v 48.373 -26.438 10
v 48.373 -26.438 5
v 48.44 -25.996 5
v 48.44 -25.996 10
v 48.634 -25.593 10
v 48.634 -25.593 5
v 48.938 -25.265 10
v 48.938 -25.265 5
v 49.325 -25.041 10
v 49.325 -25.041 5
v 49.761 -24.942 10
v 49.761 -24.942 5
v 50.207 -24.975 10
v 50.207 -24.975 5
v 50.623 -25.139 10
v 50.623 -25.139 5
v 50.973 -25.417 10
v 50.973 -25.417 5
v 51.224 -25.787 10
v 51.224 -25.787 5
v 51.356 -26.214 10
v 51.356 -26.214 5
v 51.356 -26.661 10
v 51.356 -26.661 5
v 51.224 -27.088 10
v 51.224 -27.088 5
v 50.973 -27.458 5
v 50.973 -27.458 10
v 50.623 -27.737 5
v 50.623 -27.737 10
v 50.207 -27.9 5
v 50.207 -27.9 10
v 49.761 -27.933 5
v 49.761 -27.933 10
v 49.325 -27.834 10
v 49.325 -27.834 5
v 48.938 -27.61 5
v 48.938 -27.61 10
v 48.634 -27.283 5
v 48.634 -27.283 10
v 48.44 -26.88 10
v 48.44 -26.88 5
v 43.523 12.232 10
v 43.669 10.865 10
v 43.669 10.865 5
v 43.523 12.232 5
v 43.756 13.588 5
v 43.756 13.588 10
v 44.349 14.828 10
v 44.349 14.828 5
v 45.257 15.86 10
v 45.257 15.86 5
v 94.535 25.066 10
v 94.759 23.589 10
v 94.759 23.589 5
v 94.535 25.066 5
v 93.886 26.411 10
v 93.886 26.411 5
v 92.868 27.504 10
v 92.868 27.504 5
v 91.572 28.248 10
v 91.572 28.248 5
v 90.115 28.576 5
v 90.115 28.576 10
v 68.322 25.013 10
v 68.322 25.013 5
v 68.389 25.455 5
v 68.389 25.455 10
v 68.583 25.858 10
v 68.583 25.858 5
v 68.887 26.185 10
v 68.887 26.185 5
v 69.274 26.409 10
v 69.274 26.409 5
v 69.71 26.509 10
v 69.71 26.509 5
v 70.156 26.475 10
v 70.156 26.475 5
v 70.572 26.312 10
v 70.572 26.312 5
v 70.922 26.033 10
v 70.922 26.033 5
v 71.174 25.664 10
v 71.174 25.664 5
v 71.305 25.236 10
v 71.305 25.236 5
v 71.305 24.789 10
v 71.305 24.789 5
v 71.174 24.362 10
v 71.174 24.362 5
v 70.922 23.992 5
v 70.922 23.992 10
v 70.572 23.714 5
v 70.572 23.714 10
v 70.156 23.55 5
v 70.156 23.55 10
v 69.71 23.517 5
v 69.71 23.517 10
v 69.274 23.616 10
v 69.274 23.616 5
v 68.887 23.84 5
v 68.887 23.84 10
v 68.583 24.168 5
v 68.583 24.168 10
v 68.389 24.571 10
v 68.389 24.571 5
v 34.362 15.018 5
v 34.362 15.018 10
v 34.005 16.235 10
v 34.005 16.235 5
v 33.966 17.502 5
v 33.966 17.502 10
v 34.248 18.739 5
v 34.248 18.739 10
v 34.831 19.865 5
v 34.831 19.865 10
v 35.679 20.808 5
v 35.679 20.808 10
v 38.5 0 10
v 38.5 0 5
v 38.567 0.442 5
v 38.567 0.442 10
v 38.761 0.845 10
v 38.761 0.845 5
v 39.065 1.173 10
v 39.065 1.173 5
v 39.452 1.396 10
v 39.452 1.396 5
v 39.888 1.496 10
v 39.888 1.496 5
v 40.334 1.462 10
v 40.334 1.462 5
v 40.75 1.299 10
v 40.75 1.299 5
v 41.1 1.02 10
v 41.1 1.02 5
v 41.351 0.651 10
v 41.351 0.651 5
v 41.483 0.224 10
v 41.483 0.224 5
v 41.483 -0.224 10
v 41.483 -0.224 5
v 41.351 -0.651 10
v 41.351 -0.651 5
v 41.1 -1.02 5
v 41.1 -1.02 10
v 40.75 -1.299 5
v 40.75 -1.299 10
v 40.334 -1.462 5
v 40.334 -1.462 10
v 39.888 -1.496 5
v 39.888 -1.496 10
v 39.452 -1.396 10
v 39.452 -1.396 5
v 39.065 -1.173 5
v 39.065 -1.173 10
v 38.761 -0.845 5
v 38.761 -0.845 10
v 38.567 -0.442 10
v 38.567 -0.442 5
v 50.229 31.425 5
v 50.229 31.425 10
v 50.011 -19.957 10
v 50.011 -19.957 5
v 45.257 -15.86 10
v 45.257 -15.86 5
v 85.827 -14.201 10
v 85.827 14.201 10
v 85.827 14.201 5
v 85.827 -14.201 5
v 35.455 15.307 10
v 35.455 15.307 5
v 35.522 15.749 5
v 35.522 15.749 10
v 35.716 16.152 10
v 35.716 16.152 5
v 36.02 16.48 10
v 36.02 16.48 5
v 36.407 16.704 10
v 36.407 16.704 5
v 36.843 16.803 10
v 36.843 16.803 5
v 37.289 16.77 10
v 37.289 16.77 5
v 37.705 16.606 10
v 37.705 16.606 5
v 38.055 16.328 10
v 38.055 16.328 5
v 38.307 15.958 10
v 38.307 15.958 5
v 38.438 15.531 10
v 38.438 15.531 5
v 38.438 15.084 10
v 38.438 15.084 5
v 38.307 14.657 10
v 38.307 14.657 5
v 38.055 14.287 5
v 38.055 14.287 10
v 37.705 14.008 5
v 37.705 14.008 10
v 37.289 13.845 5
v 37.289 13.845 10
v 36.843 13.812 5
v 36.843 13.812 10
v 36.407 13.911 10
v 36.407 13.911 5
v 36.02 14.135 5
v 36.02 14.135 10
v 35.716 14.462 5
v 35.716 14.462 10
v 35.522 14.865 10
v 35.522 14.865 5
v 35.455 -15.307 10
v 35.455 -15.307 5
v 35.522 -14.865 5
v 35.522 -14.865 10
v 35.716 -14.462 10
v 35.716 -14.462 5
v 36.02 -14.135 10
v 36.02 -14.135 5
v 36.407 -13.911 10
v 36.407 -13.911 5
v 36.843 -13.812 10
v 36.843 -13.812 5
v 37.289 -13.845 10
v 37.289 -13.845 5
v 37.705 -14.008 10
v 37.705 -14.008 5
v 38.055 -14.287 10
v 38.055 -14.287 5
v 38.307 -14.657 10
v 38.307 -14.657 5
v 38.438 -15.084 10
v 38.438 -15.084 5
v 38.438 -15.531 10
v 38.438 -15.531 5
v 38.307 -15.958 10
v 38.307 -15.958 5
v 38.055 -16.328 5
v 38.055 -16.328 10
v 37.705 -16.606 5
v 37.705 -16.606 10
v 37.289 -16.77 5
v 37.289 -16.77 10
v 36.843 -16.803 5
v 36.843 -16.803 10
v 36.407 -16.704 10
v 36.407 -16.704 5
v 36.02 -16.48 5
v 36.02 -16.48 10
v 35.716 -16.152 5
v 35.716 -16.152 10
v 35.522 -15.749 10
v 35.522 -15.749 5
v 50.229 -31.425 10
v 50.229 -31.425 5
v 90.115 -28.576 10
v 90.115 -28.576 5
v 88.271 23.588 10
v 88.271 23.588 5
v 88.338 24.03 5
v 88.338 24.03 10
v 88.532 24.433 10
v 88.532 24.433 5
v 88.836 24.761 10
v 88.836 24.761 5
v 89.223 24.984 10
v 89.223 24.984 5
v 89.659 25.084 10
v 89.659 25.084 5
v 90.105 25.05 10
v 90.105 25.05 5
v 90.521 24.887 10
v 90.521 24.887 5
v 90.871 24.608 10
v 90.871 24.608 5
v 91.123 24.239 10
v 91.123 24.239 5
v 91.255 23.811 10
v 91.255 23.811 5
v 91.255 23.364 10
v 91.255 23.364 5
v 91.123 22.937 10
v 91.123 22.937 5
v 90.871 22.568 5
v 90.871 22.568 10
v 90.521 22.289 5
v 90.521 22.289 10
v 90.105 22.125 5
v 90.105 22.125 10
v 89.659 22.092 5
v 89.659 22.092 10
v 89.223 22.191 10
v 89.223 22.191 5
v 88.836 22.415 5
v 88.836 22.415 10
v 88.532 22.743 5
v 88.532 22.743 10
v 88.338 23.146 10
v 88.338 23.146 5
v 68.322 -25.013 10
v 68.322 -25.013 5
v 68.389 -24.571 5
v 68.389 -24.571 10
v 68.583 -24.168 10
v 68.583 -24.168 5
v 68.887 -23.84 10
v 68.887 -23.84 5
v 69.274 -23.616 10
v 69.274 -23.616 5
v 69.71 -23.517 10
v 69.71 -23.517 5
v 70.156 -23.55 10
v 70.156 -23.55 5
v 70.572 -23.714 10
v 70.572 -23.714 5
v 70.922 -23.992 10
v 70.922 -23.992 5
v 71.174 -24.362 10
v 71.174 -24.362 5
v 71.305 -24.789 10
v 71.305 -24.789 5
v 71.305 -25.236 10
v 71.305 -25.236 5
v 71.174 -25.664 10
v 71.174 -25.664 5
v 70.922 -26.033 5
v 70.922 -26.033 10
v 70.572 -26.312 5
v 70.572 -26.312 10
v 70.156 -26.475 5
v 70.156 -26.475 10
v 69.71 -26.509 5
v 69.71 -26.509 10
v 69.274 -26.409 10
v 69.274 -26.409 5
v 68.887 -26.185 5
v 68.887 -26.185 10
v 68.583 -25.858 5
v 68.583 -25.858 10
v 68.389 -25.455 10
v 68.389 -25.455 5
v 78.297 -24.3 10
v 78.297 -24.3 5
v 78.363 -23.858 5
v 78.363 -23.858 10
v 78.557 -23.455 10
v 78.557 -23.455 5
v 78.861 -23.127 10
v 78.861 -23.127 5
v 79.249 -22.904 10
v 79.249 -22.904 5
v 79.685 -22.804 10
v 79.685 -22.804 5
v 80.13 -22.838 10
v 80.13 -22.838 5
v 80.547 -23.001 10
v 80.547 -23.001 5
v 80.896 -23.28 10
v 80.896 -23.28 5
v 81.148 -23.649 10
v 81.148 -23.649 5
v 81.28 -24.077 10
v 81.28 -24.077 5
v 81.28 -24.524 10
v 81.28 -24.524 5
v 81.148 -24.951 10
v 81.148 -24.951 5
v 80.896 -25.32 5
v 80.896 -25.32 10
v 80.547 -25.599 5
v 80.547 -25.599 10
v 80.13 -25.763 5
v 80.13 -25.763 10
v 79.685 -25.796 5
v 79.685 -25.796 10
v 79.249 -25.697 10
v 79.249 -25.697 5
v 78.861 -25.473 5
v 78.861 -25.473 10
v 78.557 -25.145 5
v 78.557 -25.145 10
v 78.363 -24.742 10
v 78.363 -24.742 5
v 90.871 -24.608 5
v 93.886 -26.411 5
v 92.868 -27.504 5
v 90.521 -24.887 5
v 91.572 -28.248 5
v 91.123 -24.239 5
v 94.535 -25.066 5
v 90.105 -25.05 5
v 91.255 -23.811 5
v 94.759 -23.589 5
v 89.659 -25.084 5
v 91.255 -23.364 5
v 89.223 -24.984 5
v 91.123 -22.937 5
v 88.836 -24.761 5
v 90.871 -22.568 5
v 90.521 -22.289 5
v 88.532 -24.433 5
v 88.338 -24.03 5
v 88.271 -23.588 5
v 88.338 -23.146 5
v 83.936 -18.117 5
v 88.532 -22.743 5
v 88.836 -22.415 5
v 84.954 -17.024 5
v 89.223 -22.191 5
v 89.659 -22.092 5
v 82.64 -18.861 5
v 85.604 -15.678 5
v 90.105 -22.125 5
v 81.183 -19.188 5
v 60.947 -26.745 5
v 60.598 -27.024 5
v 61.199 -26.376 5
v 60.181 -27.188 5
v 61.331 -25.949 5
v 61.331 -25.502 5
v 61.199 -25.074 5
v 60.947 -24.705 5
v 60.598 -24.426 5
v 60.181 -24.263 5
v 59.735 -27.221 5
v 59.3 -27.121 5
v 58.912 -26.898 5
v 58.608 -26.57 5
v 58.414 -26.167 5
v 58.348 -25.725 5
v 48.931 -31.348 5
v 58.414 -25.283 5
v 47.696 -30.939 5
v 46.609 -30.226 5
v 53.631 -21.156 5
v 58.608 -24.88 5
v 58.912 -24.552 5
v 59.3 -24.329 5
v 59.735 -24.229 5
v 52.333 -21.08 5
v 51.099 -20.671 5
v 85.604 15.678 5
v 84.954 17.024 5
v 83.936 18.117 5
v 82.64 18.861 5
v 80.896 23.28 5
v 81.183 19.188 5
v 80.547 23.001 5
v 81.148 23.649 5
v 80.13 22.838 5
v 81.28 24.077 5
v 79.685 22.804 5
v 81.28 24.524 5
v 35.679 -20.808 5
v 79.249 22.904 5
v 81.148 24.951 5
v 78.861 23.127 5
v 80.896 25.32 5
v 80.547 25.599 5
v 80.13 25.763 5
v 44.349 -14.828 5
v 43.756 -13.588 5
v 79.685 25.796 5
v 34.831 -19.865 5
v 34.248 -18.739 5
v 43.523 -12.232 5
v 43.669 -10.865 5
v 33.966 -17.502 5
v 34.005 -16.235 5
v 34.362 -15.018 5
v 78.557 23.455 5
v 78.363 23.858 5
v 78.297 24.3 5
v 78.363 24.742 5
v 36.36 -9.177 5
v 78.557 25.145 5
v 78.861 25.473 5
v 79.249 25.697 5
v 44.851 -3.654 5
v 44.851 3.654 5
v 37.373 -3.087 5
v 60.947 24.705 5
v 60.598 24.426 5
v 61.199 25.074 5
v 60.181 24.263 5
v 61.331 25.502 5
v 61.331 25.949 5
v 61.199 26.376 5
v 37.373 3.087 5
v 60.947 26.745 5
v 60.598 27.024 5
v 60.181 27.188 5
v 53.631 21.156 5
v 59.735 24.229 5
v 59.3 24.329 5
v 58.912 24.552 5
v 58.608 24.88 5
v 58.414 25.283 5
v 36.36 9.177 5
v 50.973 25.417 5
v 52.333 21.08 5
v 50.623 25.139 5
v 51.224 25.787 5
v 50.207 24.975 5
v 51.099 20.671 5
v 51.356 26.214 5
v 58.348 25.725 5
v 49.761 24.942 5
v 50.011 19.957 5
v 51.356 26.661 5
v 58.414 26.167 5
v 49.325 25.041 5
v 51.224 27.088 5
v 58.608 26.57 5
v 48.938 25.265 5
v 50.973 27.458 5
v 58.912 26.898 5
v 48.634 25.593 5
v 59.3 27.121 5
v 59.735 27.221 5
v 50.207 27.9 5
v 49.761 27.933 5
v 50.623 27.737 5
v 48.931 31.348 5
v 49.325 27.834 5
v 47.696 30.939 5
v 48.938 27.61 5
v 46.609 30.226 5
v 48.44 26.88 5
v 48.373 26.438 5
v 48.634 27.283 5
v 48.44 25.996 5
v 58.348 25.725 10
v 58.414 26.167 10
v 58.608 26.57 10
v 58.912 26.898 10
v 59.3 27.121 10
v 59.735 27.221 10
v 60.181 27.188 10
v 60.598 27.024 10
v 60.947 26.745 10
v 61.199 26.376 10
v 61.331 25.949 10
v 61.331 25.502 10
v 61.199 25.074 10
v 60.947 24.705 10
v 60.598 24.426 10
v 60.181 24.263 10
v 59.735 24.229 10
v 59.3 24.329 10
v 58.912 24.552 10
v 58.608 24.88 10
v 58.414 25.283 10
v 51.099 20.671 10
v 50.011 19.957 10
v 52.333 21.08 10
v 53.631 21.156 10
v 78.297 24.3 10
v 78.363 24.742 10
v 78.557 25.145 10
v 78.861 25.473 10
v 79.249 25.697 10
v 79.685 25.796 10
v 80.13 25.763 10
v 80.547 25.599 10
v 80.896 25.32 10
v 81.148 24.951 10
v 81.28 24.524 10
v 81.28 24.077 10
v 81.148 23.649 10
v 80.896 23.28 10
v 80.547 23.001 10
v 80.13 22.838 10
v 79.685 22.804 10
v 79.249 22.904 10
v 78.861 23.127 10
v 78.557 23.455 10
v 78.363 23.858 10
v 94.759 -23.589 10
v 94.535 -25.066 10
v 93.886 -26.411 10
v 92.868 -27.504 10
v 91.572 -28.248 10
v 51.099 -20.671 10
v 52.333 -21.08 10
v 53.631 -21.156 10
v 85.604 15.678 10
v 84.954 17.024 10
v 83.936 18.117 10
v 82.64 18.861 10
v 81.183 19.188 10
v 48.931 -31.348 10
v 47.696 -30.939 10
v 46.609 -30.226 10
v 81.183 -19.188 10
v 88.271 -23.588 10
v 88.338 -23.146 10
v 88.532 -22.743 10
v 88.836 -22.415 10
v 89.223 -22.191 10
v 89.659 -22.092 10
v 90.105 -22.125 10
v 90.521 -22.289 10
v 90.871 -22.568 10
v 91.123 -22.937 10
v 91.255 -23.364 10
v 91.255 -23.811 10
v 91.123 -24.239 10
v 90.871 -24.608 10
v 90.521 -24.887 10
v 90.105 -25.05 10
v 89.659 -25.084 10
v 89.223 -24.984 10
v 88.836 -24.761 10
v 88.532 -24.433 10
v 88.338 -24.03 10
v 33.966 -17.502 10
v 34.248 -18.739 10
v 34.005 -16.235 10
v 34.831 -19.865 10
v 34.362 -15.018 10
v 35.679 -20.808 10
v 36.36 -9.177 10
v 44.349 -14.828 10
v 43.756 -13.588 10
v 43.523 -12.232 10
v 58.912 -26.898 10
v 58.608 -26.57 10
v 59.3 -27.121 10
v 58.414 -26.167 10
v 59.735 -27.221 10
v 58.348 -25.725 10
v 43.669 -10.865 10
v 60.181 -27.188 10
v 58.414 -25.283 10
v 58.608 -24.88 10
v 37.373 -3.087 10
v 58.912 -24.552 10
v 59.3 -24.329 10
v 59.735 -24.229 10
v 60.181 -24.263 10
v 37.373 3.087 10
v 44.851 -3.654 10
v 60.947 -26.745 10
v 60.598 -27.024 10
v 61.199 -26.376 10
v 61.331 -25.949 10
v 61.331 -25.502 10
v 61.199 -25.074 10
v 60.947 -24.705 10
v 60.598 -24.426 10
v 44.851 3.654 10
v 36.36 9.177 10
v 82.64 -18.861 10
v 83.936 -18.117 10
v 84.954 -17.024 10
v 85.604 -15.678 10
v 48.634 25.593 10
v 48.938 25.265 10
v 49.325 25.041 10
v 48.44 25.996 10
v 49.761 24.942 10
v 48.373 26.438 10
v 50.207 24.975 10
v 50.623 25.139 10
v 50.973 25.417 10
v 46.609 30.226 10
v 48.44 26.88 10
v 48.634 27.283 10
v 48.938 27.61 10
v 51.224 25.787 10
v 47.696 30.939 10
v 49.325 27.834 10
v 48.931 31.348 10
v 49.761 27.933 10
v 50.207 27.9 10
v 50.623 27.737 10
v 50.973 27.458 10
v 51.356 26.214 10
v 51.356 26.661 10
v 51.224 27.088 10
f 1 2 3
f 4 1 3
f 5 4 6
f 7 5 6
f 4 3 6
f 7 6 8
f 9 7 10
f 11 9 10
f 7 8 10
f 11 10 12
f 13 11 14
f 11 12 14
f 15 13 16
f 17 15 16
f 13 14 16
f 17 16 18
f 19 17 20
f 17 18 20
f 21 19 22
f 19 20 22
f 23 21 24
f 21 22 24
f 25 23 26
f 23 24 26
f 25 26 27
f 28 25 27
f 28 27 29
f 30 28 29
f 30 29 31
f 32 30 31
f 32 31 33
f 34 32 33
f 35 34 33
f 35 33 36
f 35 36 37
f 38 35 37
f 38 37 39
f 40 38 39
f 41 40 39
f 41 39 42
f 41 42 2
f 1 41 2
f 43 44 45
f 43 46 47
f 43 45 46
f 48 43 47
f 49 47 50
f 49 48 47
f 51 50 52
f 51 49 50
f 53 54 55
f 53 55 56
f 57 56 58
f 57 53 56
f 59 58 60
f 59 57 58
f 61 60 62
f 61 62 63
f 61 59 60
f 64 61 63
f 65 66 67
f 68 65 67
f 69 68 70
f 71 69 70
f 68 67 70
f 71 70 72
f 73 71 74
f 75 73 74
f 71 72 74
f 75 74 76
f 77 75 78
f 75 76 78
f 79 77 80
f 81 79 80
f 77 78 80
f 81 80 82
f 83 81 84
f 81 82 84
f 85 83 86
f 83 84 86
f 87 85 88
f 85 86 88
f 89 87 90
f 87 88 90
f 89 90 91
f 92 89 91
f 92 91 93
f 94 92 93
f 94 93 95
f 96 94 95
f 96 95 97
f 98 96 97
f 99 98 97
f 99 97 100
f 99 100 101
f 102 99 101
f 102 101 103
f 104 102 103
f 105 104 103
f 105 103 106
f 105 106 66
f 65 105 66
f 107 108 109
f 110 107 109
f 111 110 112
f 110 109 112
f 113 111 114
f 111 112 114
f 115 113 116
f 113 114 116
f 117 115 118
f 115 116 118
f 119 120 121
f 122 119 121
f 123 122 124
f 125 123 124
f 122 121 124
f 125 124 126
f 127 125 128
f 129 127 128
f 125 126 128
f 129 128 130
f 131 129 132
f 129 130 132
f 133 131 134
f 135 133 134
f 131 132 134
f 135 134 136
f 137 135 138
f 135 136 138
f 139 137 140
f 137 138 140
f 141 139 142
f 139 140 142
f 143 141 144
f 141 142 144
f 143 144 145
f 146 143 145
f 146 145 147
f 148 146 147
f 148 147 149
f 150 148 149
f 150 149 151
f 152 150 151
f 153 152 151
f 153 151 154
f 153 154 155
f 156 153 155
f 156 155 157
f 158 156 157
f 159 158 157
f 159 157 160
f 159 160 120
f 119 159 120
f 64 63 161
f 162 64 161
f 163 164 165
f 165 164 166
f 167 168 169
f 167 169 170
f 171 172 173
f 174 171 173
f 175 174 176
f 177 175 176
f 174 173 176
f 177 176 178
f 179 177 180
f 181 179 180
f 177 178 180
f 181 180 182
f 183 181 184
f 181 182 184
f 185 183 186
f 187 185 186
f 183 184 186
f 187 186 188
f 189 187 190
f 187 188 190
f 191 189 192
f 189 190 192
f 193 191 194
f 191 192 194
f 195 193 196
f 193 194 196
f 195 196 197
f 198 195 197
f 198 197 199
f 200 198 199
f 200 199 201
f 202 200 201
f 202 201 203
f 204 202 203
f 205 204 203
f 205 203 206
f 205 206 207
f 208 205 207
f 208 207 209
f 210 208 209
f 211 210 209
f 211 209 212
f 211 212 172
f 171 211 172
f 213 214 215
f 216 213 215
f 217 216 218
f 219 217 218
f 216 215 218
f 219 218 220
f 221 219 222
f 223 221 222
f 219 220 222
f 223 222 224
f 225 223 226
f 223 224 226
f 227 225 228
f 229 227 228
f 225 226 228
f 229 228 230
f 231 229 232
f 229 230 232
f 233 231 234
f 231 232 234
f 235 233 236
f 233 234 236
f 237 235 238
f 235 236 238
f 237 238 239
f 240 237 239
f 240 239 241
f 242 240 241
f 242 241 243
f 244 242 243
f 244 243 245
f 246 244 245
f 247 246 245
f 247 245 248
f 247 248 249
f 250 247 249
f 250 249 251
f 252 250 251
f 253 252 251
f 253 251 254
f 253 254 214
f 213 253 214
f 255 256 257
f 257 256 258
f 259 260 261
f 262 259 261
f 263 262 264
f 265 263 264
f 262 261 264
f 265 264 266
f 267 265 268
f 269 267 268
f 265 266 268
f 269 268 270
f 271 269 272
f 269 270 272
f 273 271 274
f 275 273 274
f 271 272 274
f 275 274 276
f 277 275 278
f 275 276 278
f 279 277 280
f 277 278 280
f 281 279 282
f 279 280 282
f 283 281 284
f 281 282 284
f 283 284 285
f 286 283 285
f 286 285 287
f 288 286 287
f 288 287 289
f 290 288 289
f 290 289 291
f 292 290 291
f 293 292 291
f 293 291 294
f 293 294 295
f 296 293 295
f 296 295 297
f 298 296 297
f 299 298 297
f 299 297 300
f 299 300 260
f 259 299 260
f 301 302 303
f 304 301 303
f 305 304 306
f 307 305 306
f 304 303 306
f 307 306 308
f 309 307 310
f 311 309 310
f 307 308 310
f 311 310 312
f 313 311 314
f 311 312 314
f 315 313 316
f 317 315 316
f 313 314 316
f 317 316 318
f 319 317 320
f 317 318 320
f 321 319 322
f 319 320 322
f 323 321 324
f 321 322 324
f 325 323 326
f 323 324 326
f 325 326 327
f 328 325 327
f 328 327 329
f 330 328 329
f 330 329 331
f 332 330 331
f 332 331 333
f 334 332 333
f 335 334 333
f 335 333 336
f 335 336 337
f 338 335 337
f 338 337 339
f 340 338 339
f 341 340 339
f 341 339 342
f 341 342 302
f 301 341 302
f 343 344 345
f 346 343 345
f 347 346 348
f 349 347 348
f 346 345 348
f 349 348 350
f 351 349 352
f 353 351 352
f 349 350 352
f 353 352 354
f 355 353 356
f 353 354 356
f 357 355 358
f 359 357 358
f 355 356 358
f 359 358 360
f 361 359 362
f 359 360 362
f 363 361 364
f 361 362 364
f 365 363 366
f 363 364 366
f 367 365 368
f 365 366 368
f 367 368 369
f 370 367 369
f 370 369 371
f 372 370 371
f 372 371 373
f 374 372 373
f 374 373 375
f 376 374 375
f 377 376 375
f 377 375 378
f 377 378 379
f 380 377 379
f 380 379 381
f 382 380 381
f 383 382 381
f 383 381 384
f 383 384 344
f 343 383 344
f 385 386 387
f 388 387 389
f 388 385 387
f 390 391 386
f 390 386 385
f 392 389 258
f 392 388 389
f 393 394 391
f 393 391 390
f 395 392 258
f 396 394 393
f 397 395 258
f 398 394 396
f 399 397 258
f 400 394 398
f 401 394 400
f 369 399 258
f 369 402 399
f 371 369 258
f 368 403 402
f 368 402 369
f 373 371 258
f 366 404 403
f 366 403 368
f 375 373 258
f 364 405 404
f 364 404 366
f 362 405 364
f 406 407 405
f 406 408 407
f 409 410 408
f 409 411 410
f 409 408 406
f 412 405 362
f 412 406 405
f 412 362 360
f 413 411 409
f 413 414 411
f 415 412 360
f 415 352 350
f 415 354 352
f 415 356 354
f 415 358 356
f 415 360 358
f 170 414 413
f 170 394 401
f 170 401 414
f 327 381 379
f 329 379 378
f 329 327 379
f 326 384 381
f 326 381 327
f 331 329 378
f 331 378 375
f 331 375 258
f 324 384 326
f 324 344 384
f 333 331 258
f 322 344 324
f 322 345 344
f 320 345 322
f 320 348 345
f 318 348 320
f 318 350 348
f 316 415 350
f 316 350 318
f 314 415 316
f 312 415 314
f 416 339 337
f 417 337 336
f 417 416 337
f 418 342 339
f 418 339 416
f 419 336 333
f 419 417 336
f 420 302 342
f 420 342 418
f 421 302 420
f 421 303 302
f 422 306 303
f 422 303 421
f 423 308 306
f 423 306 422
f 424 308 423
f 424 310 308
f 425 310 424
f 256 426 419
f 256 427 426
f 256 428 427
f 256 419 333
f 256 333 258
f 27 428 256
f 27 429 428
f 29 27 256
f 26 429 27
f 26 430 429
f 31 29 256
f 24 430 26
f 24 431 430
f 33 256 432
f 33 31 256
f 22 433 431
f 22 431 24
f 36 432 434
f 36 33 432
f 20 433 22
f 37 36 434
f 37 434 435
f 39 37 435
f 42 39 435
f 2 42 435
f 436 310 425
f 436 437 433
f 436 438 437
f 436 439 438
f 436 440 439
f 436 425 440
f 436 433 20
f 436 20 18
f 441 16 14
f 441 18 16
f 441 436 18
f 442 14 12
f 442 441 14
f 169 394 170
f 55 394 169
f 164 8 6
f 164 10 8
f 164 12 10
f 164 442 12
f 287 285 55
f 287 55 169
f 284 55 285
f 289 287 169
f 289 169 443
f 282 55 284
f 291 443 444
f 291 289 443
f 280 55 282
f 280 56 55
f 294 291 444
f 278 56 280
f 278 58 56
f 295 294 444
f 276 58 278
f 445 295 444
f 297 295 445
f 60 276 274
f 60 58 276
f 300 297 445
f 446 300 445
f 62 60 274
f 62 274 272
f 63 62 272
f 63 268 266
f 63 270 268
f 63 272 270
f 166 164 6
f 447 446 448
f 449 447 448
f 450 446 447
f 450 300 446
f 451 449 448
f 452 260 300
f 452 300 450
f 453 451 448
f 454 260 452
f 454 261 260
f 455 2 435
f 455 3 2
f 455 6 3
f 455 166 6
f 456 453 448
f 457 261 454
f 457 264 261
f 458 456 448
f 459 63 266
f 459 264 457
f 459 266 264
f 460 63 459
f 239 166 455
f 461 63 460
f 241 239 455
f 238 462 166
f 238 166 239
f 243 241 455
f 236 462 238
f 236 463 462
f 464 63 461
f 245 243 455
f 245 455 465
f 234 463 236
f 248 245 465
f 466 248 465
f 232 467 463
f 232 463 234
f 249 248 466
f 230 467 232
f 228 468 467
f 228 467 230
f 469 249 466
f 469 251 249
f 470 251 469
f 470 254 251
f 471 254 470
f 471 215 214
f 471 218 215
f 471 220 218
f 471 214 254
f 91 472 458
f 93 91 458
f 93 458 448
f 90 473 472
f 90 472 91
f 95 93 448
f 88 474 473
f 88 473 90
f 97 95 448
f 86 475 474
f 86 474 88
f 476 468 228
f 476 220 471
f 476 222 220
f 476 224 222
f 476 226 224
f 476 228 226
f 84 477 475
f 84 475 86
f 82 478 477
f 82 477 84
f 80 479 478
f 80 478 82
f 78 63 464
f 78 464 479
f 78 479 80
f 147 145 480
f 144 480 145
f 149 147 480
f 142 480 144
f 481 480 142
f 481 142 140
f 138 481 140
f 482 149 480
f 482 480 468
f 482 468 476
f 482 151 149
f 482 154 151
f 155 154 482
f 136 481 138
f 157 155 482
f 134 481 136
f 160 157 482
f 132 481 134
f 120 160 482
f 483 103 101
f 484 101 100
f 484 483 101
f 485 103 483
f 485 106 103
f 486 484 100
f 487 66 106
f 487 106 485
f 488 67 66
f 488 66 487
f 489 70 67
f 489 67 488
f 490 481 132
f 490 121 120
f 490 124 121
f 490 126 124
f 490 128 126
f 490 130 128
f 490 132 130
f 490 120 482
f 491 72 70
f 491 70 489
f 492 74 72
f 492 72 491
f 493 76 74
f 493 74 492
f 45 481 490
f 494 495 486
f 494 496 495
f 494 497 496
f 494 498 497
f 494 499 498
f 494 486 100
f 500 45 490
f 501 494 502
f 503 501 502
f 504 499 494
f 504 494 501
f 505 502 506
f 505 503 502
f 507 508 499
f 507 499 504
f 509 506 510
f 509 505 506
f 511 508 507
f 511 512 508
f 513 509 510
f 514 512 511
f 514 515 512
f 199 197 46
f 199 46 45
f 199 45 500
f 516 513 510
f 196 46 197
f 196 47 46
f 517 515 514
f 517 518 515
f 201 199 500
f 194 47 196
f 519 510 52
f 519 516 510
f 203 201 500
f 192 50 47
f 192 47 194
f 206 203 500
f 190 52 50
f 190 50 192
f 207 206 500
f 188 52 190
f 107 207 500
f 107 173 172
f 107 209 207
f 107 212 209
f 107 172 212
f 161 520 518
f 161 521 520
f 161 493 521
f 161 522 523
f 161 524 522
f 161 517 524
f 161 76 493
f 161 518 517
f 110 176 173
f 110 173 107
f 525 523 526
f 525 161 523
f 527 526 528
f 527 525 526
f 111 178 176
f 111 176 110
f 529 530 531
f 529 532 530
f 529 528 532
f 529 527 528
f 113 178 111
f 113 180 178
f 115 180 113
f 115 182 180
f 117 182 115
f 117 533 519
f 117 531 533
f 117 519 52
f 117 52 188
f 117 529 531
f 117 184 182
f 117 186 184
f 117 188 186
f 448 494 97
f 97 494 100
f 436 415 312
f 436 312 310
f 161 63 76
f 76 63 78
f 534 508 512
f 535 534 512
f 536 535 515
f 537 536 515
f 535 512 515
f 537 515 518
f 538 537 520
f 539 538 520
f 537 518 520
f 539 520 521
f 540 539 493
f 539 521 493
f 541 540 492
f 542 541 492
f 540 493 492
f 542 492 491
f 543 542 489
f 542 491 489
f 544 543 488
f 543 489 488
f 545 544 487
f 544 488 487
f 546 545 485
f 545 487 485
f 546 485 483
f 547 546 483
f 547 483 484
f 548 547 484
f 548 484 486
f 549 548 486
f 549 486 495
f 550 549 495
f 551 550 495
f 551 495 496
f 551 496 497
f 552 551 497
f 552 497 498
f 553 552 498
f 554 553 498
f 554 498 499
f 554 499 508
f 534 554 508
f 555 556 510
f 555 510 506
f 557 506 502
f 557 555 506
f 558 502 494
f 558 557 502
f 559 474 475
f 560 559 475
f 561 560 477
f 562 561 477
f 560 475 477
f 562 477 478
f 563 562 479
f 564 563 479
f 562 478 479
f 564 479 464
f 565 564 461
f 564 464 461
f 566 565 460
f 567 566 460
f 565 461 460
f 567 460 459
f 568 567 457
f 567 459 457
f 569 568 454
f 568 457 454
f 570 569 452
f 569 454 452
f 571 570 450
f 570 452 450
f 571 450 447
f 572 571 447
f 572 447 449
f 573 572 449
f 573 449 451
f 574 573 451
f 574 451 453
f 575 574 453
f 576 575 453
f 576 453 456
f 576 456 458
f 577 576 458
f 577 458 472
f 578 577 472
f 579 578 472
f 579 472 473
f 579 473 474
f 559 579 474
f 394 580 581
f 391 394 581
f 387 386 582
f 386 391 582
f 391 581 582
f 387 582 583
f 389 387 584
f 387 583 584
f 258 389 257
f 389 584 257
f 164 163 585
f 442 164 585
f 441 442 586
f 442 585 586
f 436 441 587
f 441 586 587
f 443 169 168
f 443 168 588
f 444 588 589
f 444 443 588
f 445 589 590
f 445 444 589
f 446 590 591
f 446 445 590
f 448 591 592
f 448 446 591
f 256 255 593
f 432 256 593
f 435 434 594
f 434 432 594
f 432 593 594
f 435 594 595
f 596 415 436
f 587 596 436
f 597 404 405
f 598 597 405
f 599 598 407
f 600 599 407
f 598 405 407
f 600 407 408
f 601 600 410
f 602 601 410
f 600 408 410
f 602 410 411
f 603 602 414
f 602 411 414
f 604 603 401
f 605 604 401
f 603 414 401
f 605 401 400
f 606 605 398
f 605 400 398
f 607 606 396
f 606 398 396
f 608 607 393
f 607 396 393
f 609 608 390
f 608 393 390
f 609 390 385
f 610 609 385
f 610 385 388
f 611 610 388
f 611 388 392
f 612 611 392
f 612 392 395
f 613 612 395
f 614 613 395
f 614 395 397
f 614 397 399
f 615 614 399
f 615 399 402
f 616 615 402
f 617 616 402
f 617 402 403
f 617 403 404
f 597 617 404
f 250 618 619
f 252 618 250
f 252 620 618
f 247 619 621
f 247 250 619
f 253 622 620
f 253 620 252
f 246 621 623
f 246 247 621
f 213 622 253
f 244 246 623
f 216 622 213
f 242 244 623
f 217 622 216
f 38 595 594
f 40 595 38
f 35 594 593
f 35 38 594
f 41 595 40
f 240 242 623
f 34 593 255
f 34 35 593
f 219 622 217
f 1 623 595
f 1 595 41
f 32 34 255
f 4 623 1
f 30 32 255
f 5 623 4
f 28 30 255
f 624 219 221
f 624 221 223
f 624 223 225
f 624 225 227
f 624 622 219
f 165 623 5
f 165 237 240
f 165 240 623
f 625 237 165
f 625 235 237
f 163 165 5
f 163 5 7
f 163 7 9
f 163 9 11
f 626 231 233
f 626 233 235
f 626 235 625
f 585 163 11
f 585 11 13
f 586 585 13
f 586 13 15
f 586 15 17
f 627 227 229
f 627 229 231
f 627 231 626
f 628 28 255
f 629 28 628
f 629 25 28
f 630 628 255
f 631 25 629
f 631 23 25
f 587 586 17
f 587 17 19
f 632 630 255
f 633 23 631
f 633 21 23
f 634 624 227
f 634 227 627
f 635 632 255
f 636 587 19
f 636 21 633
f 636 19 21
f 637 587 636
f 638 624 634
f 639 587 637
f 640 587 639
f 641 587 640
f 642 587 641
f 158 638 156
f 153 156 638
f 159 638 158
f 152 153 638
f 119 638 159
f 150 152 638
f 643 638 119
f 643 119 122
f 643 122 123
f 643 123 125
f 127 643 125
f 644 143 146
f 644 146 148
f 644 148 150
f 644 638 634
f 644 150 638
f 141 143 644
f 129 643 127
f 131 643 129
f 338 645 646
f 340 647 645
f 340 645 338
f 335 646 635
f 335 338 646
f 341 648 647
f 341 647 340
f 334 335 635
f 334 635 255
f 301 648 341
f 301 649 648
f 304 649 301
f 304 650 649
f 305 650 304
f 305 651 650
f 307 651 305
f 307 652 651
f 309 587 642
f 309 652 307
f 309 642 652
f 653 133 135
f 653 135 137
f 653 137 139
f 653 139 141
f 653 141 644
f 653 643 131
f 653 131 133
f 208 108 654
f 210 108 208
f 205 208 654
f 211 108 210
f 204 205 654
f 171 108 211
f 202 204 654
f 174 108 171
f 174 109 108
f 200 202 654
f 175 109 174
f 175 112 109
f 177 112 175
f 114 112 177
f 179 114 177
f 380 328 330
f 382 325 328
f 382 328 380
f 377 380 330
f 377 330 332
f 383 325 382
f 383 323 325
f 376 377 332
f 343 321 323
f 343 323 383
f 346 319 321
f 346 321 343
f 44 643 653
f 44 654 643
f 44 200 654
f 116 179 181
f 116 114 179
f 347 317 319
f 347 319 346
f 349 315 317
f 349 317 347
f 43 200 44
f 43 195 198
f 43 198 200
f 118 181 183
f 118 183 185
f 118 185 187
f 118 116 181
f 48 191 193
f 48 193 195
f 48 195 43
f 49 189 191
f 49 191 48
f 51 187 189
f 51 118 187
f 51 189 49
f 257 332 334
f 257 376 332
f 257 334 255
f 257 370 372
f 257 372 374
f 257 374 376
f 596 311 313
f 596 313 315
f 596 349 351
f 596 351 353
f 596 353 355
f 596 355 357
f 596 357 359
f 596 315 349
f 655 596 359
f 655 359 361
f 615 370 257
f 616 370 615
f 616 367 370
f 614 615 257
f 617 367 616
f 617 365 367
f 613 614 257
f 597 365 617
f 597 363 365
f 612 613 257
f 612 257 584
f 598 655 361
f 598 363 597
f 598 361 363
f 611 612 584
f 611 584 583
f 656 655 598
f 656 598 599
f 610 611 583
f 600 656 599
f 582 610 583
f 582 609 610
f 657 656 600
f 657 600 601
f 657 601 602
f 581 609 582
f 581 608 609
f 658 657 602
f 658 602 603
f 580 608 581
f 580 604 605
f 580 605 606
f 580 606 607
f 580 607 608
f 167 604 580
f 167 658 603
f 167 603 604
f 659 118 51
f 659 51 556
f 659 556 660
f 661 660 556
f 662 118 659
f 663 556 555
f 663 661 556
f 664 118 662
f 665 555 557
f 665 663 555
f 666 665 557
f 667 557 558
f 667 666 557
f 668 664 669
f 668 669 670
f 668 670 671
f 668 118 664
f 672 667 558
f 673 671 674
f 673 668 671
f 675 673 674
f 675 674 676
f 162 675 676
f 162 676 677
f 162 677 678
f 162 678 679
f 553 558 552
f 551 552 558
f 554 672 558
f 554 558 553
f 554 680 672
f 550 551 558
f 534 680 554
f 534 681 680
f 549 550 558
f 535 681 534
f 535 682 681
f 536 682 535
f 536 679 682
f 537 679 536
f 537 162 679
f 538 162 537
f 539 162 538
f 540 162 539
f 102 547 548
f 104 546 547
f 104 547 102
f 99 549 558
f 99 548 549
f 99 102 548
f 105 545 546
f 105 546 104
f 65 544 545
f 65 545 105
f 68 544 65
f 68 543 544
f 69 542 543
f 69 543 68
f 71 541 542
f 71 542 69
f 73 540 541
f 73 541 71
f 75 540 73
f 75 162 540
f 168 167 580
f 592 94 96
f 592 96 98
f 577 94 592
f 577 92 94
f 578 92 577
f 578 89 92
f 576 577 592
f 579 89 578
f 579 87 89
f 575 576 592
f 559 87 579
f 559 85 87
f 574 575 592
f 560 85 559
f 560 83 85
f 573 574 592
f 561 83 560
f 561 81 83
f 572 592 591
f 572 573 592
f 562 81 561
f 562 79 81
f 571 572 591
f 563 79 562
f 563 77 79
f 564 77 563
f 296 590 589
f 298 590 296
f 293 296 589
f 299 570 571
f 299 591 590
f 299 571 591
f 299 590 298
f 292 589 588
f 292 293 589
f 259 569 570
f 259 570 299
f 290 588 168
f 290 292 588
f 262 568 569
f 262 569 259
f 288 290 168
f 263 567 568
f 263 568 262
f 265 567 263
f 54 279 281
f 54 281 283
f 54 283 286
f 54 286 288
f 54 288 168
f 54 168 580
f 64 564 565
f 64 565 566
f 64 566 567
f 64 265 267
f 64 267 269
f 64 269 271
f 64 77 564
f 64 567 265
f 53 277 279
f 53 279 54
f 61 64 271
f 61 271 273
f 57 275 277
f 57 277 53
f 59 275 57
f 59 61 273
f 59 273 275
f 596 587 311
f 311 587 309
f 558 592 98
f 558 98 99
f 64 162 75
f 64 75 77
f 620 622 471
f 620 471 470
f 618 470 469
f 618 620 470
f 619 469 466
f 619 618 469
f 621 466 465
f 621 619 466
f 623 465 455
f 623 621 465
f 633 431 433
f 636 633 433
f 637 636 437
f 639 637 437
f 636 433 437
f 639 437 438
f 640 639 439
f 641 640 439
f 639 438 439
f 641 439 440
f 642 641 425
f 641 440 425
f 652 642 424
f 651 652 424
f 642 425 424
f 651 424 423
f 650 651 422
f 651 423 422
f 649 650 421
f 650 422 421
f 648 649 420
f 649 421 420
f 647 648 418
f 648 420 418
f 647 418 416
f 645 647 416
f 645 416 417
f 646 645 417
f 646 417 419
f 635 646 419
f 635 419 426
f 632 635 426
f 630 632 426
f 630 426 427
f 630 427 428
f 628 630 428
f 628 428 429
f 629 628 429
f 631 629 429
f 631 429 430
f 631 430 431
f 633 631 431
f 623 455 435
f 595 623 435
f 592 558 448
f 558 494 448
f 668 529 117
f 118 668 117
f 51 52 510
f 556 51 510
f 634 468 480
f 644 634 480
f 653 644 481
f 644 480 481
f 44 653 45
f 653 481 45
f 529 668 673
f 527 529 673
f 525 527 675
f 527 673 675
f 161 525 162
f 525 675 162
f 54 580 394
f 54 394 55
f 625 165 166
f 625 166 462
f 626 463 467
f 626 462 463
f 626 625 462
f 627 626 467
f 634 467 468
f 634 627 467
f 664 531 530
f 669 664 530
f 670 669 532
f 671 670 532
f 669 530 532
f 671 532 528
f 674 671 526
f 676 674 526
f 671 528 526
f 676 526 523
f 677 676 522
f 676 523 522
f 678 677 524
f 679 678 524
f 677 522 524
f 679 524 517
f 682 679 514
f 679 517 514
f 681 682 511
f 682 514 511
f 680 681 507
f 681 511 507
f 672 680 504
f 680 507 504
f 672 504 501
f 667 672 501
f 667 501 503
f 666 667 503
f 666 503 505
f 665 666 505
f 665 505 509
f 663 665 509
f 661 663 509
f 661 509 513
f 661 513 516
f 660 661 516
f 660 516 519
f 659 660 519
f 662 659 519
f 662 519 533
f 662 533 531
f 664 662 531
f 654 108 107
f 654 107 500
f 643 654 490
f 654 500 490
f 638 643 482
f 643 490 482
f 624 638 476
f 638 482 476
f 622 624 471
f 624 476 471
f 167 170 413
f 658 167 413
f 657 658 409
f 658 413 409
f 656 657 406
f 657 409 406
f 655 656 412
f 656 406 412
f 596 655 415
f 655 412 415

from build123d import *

# Parameters (mm, degrees)
EXTRUDE_1_DEPTH     = 15
FILLET_1_R          = 5
FILLET_2_R          = 5
FILLET_3_R          = 5
FILLET_4_R          = 5
FILLET_5_R          = 5
FILLET_6_R          = 5
FILLET_7_R          = 5
FILLET_8_R          = 5
FILLET_9_R          = 5
FILLET_10_R         = 5
FILLET_11_R         = 5
FILLET_12_R         = 5
FILLET_13_R         = 5
FILLET_14_R         = 5
FILLET_15_R         = 5
FILLET_16_R         = 5
SKETCH_5_R          = 1.5
CUT_EXTRUDE_1_DEPTH = 15
CUT_EXTRUDE_START   = -15
SKETCH_6_R          = 1.5
CUT_EXTRUDE_5_DEPTH = 15
EXTRUDE_2_DEPTH     = 15
FILLET_17_R         = 5
FILLET_18_R         = 5
FILLET_19_R         = 5
FILLET_20_R         = 5
SKETCH_8_W          = 96.520141499
SKETCH_8_H          = 72.316132992
CUT_EXTRUDE_6_DEPTH = 5
SKETCH_9_W          = 91.216327174
SKETCH_9_H          = 79.967676963
CUT_EXTRUDE_7_DEPTH = 5


with BuildPart() as part:
    # 草图3 → 凸台-拉伸1 (new body)
    with BuildSketch(Plane.XY):
        with BuildLine():
            Line((101.99145665, -27.727634828), (114.18506552, -15.283623844))
            ThreePointArc((114.18506552, -15.283623844), (110, 0), (114.18506552, 15.283623844))
            Line((114.18506552, 15.283623844), (101.99145665, 27.727634828))
            Line((101.99145665, 27.727634828), (48.171786379, 31.57189699))
            Line((48.171786379, 31.57189699), (32.743622368, 18.278544642))
            ThreePointArc((32.743622368, 18.278544642), (37.5, 0), (32.743622368, -18.278544642))
            Line((32.743622368, -18.278544642), (48.171786379, -31.57189699))
            Line((48.171786379, -31.57189699), (101.99145665, -27.727634828))
        make_face()
        with BuildLine():
            ThreePointArc((42.839131819, -13.777110909), (45, 0), (42.839131819, 13.777110909))
            Line((42.839131819, 13.777110909), (51.574083604, 21.303398011))
            Line((51.574083604, 21.303398011), (97.500283316, 18.022955175))
            Line((97.500283316, 18.022955175), (106.212331228, 9.132000819))
            ThreePointArc((106.212331228, 9.132000819), (105, 0), (106.212331228, -9.132000819))
            Line((106.212331228, -9.132000819), (97.500283316, -18.022955175))
            Line((97.500283316, -18.022955175), (51.574083604, -21.303398011))
            Line((51.574083604, -21.303398011), (42.839131819, -13.777110909))
        make_face(mode=Mode.SUBTRACT)
    extrude(amount=EXTRUDE_1_DEPTH)

    # 圆角1
    fillet_1_edges = [part.edges().sort_by_distance(p)[0] for p in [
        (101.99145665, 27.727634828, 7.5),
    ]]
    fillet(fillet_1_edges, radius=FILLET_1_R)

    # 圆角2
    fillet_2_edges = [part.edges().sort_by_distance(p)[0] for p in [
        (114.18506552, 15.283623844, 7.5),
    ]]
    fillet(fillet_2_edges, radius=FILLET_2_R)

    # 圆角3
    fillet_3_edges = [part.edges().sort_by_distance(p)[0] for p in [
        (114.18506552, -15.283623844, 7.5),
    ]]
    fillet(fillet_3_edges, radius=FILLET_3_R)

    # 圆角4
    fillet_4_edges = [part.edges().sort_by_distance(p)[0] for p in [
        (101.99145665, -27.727634828, 7.5),
    ]]
    fillet(fillet_4_edges, radius=FILLET_4_R)

    # 圆角5
    fillet_5_edges = [part.edges().sort_by_distance(p)[0] for p in [
        (48.171786379, -31.57189699, 7.5),
    ]]
    fillet(fillet_5_edges, radius=FILLET_5_R)

    # 圆角6
    fillet_6_edges = [part.edges().sort_by_distance(p)[0] for p in [
        (48.171786379, 31.57189699, 7.5),
    ]]
    fillet(fillet_6_edges, radius=FILLET_6_R)

    # 圆角7
    fillet_7_edges = [part.edges().sort_by_distance(p)[0] for p in [
        (32.743622368, -18.278544642, 7.5),
    ]]
    fillet(fillet_7_edges, radius=FILLET_7_R)

    # 圆角8
    fillet_8_edges = [part.edges().sort_by_distance(p)[0] for p in [
        (32.743622368, 18.278544642, 7.5),
    ]]
    fillet(fillet_8_edges, radius=FILLET_8_R)

    # 圆角9
    fillet_9_edges = [part.edges().sort_by_distance(p)[0] for p in [
        (97.500283316, -18.022955175, 7.5),
    ]]
    fillet(fillet_9_edges, radius=FILLET_9_R)

    # 圆角10
    fillet_10_edges = [part.edges().sort_by_distance(p)[0] for p in [
        (106.212331228, -9.132000819, 7.5),
    ]]
    fillet(fillet_10_edges, radius=FILLET_10_R)

    # 圆角11
    fillet_11_edges = [part.edges().sort_by_distance(p)[0] for p in [
        (106.212331228, 9.132000819, 7.5),
    ]]
    fillet(fillet_11_edges, radius=FILLET_11_R)

    # 圆角12
    fillet_12_edges = [part.edges().sort_by_distance(p)[0] for p in [
        (97.500283316, 18.022955175, 7.5),
    ]]
    fillet(fillet_12_edges, radius=FILLET_12_R)

    # 圆角13
    fillet_13_edges = [part.edges().sort_by_distance(p)[0] for p in [
        (51.574083604, -21.303398011, 7.5),
    ]]
    fillet(fillet_13_edges, radius=FILLET_13_R)

    # 圆角14
    fillet_14_edges = [part.edges().sort_by_distance(p)[0] for p in [
        (42.839131819, -13.777110909, 7.5),
    ]]
    fillet(fillet_14_edges, radius=FILLET_14_R)

    # 圆角15
    fillet_15_edges = [part.edges().sort_by_distance(p)[0] for p in [
        (42.839131819, 13.777110909, 7.5),
    ]]
    fillet(fillet_15_edges, radius=FILLET_15_R)

    # 圆角16
    fillet_16_edges = [part.edges().sort_by_distance(p)[0] for p in [
        (51.574083604, 21.303398011, 7.5),
    ]]
    fillet(fillet_16_edges, radius=FILLET_16_R)

    # 草图5 → 切除-拉伸1 (cut)
    with BuildSketch(Plane(origin=(0, 0, 0), x_dir=(-1, 0, 0), z_dir=(0, 0, -1))):
        with Locations((-36.9551813, 15.307337295)):
            Circle(SKETCH_5_R)
        with Locations((-40, 0)):
            Circle(SKETCH_5_R)
        with Locations((-36.9551813, -15.307337295)):
            Circle(SKETCH_5_R)
        with Locations((-49.872934992, -26.437647501)):
            Circle(SKETCH_5_R)
        with Locations((-49.872934992, 26.437647501)):
            Circle(SKETCH_5_R)
        with Locations((-99.745869983, 22.875295001)):
            Circle(SKETCH_5_R)
        with Locations((-99.745869983, -22.875295001)):
            Circle(SKETCH_5_R)
        with Locations((-109.973915193, 12.437211552)):
            Circle(SKETCH_5_R)
        with Locations((-107.5, 0)):
            Circle(SKETCH_5_R)
        with Locations((-109.973915193, -12.437211552)):
            Circle(SKETCH_5_R)
        with Locations((-59.84752199, 25.725177001)):
            Circle(SKETCH_5_R)
        with Locations((-69.822108988, 25.012706501)):
            Circle(SKETCH_5_R)
        with Locations((-79.796695986, 24.300236001)):
            Circle(SKETCH_5_R)
        with Locations((-89.771282985, 23.587765501)):
            Circle(SKETCH_5_R)
        with Locations((-89.771282985, -23.587765501)):
            Circle(SKETCH_5_R)
        with Locations((-79.796695986, -24.300236001)):
            Circle(SKETCH_5_R)
        with Locations((-69.822108988, -25.012706501)):
            Circle(SKETCH_5_R)
        with Locations((-59.84752199, -25.725177001)):
            Circle(SKETCH_5_R)
    extrude(amount=-CUT_EXTRUDE_1_DEPTH, mode=Mode.SUBTRACT)

    # 草图6 → 切除-拉伸5 (cut)
    # profile 1 of 5: a face of its own
    with BuildSketch(Plane.XY.offset(15).offset(CUT_EXTRUDE_START)):
        with BuildLine():
            ThreePointArc((103.31715251, 26.374715112), (101.845820167, 27.412938577), (100.102105233, 27.8625885))
            Line((100.102105233, 27.8625885), (100.102105233, 24.332379915))
            ThreePointArc((100.102105233, 24.332379915), (100.925775249, 23.801482651), (101.245869983, 22.875295001))
            ThreePointArc((101.245869983, 22.875295001), (100.925775249, 21.949107351), (100.102105233, 21.418210087))
            Line((100.102105233, 21.418210087), (100.102105233, 15.367703489))
            Line((100.102105233, 15.367703489), (104.297377986, 11.086278624))
            ThreePointArc((104.297377986, 11.086278624), (105.514152308, 9.027175008), (105.635333526, 6.638501199))
            ThreePointArc((105.635333526, 6.638501199), (105, 0), (105.635333526, -6.638501199))
            ThreePointArc((105.635333526, -6.638501199), (105.514152308, -9.027175008), (104.297377986, -11.086278624))
            Line((104.297377986, -11.086278624), (100.102105233, -15.367703489))
            Line((100.102105233, -15.367703489), (100.102105233, -21.418210087))
            ThreePointArc((100.102105233, -21.418210087), (100.925775249, -21.949107351), (101.245869983, -22.875295001))
            ThreePointArc((101.245869983, -22.875295001), (100.925775249, -23.801482651), (100.102105233, -24.332379915))
            Line((100.102105233, -24.332379915), (100.102105233, -27.8625885))
            ThreePointArc((100.102105233, -27.8625885), (101.845820167, -27.412938577), (103.31715251, -26.374715112))
            Line((103.31715251, -26.374715112), (111.655402821, -17.865234485))
            ThreePointArc((111.655402821, -17.865234485), (113.00675492, -15.241981218), (112.643531681, -12.313555178))
            ThreePointArc((112.643531681, -12.313555178), (110, 0), (112.643531681, 12.313555178))
            ThreePointArc((112.643531681, 12.313555178), (113.00675492, 15.241981218), (111.655402821, 17.865234485))
            Line((111.655402821, 17.865234485), (103.31715251, 26.374715112))
        make_face()
        with Locations((109.973915193, -12.437211552)):
            Circle(SKETCH_6_R, mode=Mode.SUBTRACT)
        with Locations((107.5, 0)):
            Circle(SKETCH_6_R, mode=Mode.SUBTRACT)
        with Locations((109.973915193, 12.437211552)):
            Circle(SKETCH_6_R, mode=Mode.SUBTRACT)
    # profile 2 of 5: a face of its own
    with BuildSketch(Plane.XY.offset(15).offset(CUT_EXTRUDE_START)):
        with BuildLine():
            Line((100.102105233, -21.418210087), (100.102105233, -15.367703489))
            Line((100.102105233, -15.367703489), (98.825979176, -16.670035459))
            ThreePointArc((98.825979176, -16.670035459), (97.354646834, -17.708258924), (95.610931899, -18.157908847))
            Line((95.610931899, -18.157908847), (94.758576484, -18.218791377))
            Line((94.758576484, -18.218791377), (94.758576484, -23.231530251))
            Line((94.758576484, -23.231530251), (98.249681933, -22.982165576))
            ThreePointArc((98.249681933, -22.982165576), (98.778211836, -21.729154647), (100.102105233, -21.418210087))
        make_face()
    # profile 3 of 5: a face of its own
    with BuildSketch(Plane.XY.offset(15).offset(CUT_EXTRUDE_START)):
        with BuildLine():
            Line((94.758576484, -28.244269125), (100.102105233, -27.8625885))
            Line((100.102105233, -27.8625885), (100.102105233, -24.332379915))
            ThreePointArc((100.102105233, -24.332379915), (98.862330065, -24.087465457), (98.249681933, -22.982165576))
            Line((98.249681933, -22.982165576), (94.758576484, -23.231530251))
            Line((94.758576484, -23.231530251), (94.758576484, -28.244269125))
        make_face()
    # profile 4 of 5: a face of its own
    with BuildSketch(Plane.XY.offset(15).offset(CUT_EXTRUDE_START)):
        with BuildLine():
            Line((100.102105233, 15.367703489), (100.102105233, 21.418210087))
            ThreePointArc((100.102105233, 21.418210087), (98.778211836, 21.729154647), (98.249681933, 22.982165576))
            Line((98.249681933, 22.982165576), (94.758576484, 23.231530251))
            Line((94.758576484, 23.231530251), (94.758576484, 18.218791377))
            Line((94.758576484, 18.218791377), (95.610931899, 18.157908847))
            ThreePointArc((95.610931899, 18.157908847), (97.354646834, 17.708258924), (98.825979176, 16.670035459))
            Line((98.825979176, 16.670035459), (100.102105233, 15.367703489))
        make_face()
    # profile 5 of 5: a face of its own
    with BuildSketch(Plane.XY.offset(15).offset(CUT_EXTRUDE_START)):
        with BuildLine():
            Line((100.102105233, 24.332379915), (100.102105233, 27.8625885))
            Line((100.102105233, 27.8625885), (94.758576484, 28.244269125))
            Line((94.758576484, 28.244269125), (94.758576484, 23.231530251))
            Line((94.758576484, 23.231530251), (98.249681933, 22.982165576))
            ThreePointArc((98.249681933, 22.982165576), (98.862330065, 24.087465457), (100.102105233, 24.332379915))
        make_face()
    extrude(amount=CUT_EXTRUDE_5_DEPTH, mode=Mode.SUBTRACT)

    # 草图7 → 凸台-拉伸2 (add)
    with BuildSketch(Plane.XY.offset(15)):
        Polygon((94.758576484, -18.218791377), (94.758576484, 18.218791377), (85.826771952, 18.856777415), (85.826771952, -18.856777415), align=None)
    extrude(amount=-EXTRUDE_2_DEPTH)

    # 圆角17
    fillet_17_edges = [part.edges().sort_by_distance(p)[0] for p in [
        (94.758576484, 28.244269125, 7.5),
    ]]
    fillet(fillet_17_edges, radius=FILLET_17_R)

    # 圆角18
    fillet_18_edges = [part.edges().sort_by_distance(p)[0] for p in [
        (94.758576484, -28.244269125, 7.5),
    ]]
    fillet(fillet_18_edges, radius=FILLET_18_R)

    # 圆角19
    fillet_19_edges = [part.edges().sort_by_distance(p)[0] for p in [
        (85.826771952, 18.856777415, 7.5),
    ]]
    fillet(fillet_19_edges, radius=FILLET_19_R)

    # 圆角20
    fillet_20_edges = [part.edges().sort_by_distance(p)[0] for p in [
        (85.826771952, -18.856777415, 7.5),
    ]]
    fillet(fillet_20_edges, radius=FILLET_20_R)

    # 草图8 → 切除-拉伸6 (cut)
    with BuildSketch(Plane(origin=(0, 0, 0), x_dir=(-1, 0, 0), z_dir=(0, 0, -1))):
        with Locations((-67.250576804, -3.787424314)):
            Rectangle(SKETCH_8_W, SKETCH_8_H)
    extrude(amount=-CUT_EXTRUDE_6_DEPTH, mode=Mode.SUBTRACT)

    # 草图9 → 切除-拉伸7 (cut)
    with BuildSketch(Plane.XY.offset(15)):
        with Locations((64.504220749, 0.715823196)):
            Rectangle(SKETCH_9_W, SKETCH_9_H)
    extrude(amount=-CUT_EXTRUDE_7_DEPTH, mode=Mode.SUBTRACT)


solid = part.part
